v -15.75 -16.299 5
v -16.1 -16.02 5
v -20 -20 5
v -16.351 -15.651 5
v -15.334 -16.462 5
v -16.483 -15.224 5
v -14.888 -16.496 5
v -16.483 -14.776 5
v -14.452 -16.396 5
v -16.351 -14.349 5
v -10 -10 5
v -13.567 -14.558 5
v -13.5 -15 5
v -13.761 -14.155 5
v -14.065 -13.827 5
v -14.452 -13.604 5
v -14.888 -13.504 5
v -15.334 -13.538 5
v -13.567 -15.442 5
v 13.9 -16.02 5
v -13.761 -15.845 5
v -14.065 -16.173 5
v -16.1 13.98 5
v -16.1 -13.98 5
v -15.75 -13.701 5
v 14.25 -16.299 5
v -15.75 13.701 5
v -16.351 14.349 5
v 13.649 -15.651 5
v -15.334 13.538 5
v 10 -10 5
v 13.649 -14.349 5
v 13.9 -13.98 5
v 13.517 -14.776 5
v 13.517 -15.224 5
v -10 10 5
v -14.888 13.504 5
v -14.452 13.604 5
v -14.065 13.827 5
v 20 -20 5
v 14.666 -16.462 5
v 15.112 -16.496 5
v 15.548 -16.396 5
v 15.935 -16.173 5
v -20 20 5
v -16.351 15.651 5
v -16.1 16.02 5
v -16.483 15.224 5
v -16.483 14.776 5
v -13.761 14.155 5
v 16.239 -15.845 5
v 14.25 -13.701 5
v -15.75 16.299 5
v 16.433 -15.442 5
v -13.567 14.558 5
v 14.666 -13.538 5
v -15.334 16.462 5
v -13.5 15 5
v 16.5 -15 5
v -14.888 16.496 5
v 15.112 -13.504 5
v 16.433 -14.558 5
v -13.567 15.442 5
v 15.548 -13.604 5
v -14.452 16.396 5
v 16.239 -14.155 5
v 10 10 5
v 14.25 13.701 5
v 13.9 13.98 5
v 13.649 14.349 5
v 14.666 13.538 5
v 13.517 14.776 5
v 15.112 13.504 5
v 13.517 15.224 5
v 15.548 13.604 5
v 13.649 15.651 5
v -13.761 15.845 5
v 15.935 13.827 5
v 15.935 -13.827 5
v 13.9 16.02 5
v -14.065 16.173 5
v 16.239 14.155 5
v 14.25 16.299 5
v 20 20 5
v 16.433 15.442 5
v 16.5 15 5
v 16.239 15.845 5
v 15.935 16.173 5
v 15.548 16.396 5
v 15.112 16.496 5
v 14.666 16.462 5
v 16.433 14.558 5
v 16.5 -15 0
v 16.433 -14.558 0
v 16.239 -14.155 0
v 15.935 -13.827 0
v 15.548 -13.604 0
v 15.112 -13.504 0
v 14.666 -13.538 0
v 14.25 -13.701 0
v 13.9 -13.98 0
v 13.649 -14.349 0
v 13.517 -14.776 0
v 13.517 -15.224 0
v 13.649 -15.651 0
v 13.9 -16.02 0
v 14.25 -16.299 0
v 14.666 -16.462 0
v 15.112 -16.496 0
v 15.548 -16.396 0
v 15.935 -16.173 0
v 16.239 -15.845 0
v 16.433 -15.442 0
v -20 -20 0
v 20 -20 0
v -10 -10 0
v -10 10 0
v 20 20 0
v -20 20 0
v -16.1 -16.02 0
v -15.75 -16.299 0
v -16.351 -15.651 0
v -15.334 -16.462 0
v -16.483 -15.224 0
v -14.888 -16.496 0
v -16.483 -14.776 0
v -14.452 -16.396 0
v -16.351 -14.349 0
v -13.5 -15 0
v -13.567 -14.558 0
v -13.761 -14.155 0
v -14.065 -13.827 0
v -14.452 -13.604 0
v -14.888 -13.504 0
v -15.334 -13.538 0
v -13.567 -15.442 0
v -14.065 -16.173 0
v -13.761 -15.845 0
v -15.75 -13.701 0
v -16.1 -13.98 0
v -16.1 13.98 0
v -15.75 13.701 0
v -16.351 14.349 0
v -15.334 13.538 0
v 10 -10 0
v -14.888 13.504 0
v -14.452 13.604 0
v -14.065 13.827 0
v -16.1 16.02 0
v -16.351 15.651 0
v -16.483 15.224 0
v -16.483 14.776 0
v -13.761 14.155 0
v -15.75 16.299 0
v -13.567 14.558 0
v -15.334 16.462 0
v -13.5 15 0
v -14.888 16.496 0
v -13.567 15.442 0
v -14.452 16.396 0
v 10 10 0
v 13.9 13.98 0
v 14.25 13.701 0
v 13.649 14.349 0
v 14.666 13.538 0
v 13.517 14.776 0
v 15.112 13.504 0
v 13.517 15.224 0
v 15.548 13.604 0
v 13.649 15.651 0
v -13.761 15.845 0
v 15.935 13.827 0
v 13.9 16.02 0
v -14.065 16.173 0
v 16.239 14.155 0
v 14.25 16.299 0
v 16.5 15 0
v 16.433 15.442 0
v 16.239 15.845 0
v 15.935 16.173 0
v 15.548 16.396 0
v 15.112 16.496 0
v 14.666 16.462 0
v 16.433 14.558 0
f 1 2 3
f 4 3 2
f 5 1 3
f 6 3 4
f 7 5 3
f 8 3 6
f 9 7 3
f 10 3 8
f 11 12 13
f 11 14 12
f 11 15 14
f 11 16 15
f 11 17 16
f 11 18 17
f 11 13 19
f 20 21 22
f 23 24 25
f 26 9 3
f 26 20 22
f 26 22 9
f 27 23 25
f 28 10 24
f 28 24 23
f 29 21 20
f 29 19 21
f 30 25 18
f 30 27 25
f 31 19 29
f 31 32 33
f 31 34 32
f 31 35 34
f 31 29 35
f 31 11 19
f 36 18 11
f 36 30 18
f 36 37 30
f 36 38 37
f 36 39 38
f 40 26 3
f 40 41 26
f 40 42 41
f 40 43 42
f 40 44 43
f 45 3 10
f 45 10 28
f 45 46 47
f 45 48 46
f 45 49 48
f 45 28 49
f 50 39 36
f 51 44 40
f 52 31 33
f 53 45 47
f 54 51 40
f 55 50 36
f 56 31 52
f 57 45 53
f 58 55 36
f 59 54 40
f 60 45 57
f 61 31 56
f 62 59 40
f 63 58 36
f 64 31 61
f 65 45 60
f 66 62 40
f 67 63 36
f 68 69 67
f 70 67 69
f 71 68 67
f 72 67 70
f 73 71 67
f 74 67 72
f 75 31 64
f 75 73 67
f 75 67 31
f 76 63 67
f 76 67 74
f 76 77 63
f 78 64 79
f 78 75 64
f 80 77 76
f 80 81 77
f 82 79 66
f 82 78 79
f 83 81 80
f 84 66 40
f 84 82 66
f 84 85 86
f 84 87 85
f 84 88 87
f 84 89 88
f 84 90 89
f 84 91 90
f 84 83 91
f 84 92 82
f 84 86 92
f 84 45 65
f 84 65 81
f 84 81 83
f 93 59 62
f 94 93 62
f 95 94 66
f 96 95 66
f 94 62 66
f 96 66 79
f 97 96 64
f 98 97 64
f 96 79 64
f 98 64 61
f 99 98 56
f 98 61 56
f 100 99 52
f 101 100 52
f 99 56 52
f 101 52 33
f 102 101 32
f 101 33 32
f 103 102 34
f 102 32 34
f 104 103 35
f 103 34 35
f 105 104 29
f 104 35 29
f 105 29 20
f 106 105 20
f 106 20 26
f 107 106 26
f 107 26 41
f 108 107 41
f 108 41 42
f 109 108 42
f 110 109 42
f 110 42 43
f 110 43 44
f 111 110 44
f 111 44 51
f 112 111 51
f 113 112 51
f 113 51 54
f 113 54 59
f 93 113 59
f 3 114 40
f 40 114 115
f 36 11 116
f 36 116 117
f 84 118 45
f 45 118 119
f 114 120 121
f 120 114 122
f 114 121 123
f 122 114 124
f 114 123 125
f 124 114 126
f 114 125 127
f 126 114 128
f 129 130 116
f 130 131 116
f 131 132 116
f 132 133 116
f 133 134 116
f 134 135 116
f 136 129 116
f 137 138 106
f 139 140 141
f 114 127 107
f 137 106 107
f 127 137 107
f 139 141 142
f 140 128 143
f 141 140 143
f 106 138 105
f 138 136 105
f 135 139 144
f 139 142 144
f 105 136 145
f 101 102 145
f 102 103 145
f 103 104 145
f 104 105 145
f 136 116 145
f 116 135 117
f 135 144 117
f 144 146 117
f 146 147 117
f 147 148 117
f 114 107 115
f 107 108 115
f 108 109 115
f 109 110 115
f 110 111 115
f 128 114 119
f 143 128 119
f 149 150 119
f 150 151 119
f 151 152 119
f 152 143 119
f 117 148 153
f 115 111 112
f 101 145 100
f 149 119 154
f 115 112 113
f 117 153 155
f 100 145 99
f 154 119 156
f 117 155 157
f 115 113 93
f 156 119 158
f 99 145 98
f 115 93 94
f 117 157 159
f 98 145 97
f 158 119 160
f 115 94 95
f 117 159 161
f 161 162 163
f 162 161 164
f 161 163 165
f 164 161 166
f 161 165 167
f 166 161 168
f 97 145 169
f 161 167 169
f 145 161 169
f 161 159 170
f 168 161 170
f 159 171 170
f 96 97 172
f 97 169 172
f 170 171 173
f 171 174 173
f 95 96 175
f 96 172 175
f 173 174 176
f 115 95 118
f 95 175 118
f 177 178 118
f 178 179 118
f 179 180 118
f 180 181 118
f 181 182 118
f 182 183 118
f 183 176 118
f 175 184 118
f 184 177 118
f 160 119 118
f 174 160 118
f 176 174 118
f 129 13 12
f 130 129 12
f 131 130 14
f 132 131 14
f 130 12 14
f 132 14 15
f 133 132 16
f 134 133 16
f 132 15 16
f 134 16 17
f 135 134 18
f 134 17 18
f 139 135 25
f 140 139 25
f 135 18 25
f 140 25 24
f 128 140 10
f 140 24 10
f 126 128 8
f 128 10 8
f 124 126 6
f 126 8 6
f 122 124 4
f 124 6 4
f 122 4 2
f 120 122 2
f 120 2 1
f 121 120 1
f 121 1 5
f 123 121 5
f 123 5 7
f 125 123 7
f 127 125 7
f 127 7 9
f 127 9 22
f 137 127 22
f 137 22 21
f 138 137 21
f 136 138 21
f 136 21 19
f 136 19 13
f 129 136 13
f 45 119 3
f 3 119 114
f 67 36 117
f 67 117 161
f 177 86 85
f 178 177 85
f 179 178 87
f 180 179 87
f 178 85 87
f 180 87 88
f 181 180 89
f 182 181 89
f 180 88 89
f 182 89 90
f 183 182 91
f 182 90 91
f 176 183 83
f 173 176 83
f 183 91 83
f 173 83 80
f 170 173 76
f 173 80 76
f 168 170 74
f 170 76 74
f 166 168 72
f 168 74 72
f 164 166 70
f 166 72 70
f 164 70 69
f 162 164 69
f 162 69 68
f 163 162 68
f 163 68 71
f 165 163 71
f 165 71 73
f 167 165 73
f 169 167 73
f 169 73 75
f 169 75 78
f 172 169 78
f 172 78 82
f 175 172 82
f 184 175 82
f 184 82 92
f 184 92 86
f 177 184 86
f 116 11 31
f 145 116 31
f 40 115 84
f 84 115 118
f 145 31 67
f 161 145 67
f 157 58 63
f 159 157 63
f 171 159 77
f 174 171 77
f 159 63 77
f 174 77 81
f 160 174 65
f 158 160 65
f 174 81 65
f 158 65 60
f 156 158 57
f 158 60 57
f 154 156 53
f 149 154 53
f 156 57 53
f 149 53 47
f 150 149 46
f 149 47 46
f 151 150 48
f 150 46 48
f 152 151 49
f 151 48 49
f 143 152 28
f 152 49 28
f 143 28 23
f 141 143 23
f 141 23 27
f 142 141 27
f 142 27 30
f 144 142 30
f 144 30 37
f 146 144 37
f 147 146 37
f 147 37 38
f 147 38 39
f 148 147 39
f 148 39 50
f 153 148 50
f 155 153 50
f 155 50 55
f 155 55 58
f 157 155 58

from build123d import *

# Parameters (mm, degrees)
RESSALTO_EXTRUS_O1_DEPTH = 5
ESBO_O2_R                = 1.5
ESBO_O2_W                = 20
ESBO_O2_H                = 20
CORTE_EXTRUS_O1_DEPTH    = 29.722813233


with BuildPart() as part:
    # Esboço1 → Ressalto-extrusão1 (new body)
    with BuildSketch(Plane.XY):
        Polygon((20, 0), (20, 20), (-20, 20), (-20, -20), (20, -20), align=None)
    extrude(amount=RESSALTO_EXTRUS_O1_DEPTH)

    # Esboço2 → Corte-extrusão1 (cut, through all)
    with BuildSketch(Plane.XY.offset(5)):
        with Locations((-15, 15)):
            Circle(ESBO_O2_R)
        with Locations((15, 15)):
            Circle(ESBO_O2_R)
        with Locations((-15, -15)):
            Circle(ESBO_O2_R)
        with Locations((15, -15)):
            Circle(ESBO_O2_R)
        Rectangle(ESBO_O2_W, ESBO_O2_H)
    extrude(amount=-CORTE_EXTRUS_O1_DEPTH, mode=Mode.SUBTRACT)


solid = part.part
